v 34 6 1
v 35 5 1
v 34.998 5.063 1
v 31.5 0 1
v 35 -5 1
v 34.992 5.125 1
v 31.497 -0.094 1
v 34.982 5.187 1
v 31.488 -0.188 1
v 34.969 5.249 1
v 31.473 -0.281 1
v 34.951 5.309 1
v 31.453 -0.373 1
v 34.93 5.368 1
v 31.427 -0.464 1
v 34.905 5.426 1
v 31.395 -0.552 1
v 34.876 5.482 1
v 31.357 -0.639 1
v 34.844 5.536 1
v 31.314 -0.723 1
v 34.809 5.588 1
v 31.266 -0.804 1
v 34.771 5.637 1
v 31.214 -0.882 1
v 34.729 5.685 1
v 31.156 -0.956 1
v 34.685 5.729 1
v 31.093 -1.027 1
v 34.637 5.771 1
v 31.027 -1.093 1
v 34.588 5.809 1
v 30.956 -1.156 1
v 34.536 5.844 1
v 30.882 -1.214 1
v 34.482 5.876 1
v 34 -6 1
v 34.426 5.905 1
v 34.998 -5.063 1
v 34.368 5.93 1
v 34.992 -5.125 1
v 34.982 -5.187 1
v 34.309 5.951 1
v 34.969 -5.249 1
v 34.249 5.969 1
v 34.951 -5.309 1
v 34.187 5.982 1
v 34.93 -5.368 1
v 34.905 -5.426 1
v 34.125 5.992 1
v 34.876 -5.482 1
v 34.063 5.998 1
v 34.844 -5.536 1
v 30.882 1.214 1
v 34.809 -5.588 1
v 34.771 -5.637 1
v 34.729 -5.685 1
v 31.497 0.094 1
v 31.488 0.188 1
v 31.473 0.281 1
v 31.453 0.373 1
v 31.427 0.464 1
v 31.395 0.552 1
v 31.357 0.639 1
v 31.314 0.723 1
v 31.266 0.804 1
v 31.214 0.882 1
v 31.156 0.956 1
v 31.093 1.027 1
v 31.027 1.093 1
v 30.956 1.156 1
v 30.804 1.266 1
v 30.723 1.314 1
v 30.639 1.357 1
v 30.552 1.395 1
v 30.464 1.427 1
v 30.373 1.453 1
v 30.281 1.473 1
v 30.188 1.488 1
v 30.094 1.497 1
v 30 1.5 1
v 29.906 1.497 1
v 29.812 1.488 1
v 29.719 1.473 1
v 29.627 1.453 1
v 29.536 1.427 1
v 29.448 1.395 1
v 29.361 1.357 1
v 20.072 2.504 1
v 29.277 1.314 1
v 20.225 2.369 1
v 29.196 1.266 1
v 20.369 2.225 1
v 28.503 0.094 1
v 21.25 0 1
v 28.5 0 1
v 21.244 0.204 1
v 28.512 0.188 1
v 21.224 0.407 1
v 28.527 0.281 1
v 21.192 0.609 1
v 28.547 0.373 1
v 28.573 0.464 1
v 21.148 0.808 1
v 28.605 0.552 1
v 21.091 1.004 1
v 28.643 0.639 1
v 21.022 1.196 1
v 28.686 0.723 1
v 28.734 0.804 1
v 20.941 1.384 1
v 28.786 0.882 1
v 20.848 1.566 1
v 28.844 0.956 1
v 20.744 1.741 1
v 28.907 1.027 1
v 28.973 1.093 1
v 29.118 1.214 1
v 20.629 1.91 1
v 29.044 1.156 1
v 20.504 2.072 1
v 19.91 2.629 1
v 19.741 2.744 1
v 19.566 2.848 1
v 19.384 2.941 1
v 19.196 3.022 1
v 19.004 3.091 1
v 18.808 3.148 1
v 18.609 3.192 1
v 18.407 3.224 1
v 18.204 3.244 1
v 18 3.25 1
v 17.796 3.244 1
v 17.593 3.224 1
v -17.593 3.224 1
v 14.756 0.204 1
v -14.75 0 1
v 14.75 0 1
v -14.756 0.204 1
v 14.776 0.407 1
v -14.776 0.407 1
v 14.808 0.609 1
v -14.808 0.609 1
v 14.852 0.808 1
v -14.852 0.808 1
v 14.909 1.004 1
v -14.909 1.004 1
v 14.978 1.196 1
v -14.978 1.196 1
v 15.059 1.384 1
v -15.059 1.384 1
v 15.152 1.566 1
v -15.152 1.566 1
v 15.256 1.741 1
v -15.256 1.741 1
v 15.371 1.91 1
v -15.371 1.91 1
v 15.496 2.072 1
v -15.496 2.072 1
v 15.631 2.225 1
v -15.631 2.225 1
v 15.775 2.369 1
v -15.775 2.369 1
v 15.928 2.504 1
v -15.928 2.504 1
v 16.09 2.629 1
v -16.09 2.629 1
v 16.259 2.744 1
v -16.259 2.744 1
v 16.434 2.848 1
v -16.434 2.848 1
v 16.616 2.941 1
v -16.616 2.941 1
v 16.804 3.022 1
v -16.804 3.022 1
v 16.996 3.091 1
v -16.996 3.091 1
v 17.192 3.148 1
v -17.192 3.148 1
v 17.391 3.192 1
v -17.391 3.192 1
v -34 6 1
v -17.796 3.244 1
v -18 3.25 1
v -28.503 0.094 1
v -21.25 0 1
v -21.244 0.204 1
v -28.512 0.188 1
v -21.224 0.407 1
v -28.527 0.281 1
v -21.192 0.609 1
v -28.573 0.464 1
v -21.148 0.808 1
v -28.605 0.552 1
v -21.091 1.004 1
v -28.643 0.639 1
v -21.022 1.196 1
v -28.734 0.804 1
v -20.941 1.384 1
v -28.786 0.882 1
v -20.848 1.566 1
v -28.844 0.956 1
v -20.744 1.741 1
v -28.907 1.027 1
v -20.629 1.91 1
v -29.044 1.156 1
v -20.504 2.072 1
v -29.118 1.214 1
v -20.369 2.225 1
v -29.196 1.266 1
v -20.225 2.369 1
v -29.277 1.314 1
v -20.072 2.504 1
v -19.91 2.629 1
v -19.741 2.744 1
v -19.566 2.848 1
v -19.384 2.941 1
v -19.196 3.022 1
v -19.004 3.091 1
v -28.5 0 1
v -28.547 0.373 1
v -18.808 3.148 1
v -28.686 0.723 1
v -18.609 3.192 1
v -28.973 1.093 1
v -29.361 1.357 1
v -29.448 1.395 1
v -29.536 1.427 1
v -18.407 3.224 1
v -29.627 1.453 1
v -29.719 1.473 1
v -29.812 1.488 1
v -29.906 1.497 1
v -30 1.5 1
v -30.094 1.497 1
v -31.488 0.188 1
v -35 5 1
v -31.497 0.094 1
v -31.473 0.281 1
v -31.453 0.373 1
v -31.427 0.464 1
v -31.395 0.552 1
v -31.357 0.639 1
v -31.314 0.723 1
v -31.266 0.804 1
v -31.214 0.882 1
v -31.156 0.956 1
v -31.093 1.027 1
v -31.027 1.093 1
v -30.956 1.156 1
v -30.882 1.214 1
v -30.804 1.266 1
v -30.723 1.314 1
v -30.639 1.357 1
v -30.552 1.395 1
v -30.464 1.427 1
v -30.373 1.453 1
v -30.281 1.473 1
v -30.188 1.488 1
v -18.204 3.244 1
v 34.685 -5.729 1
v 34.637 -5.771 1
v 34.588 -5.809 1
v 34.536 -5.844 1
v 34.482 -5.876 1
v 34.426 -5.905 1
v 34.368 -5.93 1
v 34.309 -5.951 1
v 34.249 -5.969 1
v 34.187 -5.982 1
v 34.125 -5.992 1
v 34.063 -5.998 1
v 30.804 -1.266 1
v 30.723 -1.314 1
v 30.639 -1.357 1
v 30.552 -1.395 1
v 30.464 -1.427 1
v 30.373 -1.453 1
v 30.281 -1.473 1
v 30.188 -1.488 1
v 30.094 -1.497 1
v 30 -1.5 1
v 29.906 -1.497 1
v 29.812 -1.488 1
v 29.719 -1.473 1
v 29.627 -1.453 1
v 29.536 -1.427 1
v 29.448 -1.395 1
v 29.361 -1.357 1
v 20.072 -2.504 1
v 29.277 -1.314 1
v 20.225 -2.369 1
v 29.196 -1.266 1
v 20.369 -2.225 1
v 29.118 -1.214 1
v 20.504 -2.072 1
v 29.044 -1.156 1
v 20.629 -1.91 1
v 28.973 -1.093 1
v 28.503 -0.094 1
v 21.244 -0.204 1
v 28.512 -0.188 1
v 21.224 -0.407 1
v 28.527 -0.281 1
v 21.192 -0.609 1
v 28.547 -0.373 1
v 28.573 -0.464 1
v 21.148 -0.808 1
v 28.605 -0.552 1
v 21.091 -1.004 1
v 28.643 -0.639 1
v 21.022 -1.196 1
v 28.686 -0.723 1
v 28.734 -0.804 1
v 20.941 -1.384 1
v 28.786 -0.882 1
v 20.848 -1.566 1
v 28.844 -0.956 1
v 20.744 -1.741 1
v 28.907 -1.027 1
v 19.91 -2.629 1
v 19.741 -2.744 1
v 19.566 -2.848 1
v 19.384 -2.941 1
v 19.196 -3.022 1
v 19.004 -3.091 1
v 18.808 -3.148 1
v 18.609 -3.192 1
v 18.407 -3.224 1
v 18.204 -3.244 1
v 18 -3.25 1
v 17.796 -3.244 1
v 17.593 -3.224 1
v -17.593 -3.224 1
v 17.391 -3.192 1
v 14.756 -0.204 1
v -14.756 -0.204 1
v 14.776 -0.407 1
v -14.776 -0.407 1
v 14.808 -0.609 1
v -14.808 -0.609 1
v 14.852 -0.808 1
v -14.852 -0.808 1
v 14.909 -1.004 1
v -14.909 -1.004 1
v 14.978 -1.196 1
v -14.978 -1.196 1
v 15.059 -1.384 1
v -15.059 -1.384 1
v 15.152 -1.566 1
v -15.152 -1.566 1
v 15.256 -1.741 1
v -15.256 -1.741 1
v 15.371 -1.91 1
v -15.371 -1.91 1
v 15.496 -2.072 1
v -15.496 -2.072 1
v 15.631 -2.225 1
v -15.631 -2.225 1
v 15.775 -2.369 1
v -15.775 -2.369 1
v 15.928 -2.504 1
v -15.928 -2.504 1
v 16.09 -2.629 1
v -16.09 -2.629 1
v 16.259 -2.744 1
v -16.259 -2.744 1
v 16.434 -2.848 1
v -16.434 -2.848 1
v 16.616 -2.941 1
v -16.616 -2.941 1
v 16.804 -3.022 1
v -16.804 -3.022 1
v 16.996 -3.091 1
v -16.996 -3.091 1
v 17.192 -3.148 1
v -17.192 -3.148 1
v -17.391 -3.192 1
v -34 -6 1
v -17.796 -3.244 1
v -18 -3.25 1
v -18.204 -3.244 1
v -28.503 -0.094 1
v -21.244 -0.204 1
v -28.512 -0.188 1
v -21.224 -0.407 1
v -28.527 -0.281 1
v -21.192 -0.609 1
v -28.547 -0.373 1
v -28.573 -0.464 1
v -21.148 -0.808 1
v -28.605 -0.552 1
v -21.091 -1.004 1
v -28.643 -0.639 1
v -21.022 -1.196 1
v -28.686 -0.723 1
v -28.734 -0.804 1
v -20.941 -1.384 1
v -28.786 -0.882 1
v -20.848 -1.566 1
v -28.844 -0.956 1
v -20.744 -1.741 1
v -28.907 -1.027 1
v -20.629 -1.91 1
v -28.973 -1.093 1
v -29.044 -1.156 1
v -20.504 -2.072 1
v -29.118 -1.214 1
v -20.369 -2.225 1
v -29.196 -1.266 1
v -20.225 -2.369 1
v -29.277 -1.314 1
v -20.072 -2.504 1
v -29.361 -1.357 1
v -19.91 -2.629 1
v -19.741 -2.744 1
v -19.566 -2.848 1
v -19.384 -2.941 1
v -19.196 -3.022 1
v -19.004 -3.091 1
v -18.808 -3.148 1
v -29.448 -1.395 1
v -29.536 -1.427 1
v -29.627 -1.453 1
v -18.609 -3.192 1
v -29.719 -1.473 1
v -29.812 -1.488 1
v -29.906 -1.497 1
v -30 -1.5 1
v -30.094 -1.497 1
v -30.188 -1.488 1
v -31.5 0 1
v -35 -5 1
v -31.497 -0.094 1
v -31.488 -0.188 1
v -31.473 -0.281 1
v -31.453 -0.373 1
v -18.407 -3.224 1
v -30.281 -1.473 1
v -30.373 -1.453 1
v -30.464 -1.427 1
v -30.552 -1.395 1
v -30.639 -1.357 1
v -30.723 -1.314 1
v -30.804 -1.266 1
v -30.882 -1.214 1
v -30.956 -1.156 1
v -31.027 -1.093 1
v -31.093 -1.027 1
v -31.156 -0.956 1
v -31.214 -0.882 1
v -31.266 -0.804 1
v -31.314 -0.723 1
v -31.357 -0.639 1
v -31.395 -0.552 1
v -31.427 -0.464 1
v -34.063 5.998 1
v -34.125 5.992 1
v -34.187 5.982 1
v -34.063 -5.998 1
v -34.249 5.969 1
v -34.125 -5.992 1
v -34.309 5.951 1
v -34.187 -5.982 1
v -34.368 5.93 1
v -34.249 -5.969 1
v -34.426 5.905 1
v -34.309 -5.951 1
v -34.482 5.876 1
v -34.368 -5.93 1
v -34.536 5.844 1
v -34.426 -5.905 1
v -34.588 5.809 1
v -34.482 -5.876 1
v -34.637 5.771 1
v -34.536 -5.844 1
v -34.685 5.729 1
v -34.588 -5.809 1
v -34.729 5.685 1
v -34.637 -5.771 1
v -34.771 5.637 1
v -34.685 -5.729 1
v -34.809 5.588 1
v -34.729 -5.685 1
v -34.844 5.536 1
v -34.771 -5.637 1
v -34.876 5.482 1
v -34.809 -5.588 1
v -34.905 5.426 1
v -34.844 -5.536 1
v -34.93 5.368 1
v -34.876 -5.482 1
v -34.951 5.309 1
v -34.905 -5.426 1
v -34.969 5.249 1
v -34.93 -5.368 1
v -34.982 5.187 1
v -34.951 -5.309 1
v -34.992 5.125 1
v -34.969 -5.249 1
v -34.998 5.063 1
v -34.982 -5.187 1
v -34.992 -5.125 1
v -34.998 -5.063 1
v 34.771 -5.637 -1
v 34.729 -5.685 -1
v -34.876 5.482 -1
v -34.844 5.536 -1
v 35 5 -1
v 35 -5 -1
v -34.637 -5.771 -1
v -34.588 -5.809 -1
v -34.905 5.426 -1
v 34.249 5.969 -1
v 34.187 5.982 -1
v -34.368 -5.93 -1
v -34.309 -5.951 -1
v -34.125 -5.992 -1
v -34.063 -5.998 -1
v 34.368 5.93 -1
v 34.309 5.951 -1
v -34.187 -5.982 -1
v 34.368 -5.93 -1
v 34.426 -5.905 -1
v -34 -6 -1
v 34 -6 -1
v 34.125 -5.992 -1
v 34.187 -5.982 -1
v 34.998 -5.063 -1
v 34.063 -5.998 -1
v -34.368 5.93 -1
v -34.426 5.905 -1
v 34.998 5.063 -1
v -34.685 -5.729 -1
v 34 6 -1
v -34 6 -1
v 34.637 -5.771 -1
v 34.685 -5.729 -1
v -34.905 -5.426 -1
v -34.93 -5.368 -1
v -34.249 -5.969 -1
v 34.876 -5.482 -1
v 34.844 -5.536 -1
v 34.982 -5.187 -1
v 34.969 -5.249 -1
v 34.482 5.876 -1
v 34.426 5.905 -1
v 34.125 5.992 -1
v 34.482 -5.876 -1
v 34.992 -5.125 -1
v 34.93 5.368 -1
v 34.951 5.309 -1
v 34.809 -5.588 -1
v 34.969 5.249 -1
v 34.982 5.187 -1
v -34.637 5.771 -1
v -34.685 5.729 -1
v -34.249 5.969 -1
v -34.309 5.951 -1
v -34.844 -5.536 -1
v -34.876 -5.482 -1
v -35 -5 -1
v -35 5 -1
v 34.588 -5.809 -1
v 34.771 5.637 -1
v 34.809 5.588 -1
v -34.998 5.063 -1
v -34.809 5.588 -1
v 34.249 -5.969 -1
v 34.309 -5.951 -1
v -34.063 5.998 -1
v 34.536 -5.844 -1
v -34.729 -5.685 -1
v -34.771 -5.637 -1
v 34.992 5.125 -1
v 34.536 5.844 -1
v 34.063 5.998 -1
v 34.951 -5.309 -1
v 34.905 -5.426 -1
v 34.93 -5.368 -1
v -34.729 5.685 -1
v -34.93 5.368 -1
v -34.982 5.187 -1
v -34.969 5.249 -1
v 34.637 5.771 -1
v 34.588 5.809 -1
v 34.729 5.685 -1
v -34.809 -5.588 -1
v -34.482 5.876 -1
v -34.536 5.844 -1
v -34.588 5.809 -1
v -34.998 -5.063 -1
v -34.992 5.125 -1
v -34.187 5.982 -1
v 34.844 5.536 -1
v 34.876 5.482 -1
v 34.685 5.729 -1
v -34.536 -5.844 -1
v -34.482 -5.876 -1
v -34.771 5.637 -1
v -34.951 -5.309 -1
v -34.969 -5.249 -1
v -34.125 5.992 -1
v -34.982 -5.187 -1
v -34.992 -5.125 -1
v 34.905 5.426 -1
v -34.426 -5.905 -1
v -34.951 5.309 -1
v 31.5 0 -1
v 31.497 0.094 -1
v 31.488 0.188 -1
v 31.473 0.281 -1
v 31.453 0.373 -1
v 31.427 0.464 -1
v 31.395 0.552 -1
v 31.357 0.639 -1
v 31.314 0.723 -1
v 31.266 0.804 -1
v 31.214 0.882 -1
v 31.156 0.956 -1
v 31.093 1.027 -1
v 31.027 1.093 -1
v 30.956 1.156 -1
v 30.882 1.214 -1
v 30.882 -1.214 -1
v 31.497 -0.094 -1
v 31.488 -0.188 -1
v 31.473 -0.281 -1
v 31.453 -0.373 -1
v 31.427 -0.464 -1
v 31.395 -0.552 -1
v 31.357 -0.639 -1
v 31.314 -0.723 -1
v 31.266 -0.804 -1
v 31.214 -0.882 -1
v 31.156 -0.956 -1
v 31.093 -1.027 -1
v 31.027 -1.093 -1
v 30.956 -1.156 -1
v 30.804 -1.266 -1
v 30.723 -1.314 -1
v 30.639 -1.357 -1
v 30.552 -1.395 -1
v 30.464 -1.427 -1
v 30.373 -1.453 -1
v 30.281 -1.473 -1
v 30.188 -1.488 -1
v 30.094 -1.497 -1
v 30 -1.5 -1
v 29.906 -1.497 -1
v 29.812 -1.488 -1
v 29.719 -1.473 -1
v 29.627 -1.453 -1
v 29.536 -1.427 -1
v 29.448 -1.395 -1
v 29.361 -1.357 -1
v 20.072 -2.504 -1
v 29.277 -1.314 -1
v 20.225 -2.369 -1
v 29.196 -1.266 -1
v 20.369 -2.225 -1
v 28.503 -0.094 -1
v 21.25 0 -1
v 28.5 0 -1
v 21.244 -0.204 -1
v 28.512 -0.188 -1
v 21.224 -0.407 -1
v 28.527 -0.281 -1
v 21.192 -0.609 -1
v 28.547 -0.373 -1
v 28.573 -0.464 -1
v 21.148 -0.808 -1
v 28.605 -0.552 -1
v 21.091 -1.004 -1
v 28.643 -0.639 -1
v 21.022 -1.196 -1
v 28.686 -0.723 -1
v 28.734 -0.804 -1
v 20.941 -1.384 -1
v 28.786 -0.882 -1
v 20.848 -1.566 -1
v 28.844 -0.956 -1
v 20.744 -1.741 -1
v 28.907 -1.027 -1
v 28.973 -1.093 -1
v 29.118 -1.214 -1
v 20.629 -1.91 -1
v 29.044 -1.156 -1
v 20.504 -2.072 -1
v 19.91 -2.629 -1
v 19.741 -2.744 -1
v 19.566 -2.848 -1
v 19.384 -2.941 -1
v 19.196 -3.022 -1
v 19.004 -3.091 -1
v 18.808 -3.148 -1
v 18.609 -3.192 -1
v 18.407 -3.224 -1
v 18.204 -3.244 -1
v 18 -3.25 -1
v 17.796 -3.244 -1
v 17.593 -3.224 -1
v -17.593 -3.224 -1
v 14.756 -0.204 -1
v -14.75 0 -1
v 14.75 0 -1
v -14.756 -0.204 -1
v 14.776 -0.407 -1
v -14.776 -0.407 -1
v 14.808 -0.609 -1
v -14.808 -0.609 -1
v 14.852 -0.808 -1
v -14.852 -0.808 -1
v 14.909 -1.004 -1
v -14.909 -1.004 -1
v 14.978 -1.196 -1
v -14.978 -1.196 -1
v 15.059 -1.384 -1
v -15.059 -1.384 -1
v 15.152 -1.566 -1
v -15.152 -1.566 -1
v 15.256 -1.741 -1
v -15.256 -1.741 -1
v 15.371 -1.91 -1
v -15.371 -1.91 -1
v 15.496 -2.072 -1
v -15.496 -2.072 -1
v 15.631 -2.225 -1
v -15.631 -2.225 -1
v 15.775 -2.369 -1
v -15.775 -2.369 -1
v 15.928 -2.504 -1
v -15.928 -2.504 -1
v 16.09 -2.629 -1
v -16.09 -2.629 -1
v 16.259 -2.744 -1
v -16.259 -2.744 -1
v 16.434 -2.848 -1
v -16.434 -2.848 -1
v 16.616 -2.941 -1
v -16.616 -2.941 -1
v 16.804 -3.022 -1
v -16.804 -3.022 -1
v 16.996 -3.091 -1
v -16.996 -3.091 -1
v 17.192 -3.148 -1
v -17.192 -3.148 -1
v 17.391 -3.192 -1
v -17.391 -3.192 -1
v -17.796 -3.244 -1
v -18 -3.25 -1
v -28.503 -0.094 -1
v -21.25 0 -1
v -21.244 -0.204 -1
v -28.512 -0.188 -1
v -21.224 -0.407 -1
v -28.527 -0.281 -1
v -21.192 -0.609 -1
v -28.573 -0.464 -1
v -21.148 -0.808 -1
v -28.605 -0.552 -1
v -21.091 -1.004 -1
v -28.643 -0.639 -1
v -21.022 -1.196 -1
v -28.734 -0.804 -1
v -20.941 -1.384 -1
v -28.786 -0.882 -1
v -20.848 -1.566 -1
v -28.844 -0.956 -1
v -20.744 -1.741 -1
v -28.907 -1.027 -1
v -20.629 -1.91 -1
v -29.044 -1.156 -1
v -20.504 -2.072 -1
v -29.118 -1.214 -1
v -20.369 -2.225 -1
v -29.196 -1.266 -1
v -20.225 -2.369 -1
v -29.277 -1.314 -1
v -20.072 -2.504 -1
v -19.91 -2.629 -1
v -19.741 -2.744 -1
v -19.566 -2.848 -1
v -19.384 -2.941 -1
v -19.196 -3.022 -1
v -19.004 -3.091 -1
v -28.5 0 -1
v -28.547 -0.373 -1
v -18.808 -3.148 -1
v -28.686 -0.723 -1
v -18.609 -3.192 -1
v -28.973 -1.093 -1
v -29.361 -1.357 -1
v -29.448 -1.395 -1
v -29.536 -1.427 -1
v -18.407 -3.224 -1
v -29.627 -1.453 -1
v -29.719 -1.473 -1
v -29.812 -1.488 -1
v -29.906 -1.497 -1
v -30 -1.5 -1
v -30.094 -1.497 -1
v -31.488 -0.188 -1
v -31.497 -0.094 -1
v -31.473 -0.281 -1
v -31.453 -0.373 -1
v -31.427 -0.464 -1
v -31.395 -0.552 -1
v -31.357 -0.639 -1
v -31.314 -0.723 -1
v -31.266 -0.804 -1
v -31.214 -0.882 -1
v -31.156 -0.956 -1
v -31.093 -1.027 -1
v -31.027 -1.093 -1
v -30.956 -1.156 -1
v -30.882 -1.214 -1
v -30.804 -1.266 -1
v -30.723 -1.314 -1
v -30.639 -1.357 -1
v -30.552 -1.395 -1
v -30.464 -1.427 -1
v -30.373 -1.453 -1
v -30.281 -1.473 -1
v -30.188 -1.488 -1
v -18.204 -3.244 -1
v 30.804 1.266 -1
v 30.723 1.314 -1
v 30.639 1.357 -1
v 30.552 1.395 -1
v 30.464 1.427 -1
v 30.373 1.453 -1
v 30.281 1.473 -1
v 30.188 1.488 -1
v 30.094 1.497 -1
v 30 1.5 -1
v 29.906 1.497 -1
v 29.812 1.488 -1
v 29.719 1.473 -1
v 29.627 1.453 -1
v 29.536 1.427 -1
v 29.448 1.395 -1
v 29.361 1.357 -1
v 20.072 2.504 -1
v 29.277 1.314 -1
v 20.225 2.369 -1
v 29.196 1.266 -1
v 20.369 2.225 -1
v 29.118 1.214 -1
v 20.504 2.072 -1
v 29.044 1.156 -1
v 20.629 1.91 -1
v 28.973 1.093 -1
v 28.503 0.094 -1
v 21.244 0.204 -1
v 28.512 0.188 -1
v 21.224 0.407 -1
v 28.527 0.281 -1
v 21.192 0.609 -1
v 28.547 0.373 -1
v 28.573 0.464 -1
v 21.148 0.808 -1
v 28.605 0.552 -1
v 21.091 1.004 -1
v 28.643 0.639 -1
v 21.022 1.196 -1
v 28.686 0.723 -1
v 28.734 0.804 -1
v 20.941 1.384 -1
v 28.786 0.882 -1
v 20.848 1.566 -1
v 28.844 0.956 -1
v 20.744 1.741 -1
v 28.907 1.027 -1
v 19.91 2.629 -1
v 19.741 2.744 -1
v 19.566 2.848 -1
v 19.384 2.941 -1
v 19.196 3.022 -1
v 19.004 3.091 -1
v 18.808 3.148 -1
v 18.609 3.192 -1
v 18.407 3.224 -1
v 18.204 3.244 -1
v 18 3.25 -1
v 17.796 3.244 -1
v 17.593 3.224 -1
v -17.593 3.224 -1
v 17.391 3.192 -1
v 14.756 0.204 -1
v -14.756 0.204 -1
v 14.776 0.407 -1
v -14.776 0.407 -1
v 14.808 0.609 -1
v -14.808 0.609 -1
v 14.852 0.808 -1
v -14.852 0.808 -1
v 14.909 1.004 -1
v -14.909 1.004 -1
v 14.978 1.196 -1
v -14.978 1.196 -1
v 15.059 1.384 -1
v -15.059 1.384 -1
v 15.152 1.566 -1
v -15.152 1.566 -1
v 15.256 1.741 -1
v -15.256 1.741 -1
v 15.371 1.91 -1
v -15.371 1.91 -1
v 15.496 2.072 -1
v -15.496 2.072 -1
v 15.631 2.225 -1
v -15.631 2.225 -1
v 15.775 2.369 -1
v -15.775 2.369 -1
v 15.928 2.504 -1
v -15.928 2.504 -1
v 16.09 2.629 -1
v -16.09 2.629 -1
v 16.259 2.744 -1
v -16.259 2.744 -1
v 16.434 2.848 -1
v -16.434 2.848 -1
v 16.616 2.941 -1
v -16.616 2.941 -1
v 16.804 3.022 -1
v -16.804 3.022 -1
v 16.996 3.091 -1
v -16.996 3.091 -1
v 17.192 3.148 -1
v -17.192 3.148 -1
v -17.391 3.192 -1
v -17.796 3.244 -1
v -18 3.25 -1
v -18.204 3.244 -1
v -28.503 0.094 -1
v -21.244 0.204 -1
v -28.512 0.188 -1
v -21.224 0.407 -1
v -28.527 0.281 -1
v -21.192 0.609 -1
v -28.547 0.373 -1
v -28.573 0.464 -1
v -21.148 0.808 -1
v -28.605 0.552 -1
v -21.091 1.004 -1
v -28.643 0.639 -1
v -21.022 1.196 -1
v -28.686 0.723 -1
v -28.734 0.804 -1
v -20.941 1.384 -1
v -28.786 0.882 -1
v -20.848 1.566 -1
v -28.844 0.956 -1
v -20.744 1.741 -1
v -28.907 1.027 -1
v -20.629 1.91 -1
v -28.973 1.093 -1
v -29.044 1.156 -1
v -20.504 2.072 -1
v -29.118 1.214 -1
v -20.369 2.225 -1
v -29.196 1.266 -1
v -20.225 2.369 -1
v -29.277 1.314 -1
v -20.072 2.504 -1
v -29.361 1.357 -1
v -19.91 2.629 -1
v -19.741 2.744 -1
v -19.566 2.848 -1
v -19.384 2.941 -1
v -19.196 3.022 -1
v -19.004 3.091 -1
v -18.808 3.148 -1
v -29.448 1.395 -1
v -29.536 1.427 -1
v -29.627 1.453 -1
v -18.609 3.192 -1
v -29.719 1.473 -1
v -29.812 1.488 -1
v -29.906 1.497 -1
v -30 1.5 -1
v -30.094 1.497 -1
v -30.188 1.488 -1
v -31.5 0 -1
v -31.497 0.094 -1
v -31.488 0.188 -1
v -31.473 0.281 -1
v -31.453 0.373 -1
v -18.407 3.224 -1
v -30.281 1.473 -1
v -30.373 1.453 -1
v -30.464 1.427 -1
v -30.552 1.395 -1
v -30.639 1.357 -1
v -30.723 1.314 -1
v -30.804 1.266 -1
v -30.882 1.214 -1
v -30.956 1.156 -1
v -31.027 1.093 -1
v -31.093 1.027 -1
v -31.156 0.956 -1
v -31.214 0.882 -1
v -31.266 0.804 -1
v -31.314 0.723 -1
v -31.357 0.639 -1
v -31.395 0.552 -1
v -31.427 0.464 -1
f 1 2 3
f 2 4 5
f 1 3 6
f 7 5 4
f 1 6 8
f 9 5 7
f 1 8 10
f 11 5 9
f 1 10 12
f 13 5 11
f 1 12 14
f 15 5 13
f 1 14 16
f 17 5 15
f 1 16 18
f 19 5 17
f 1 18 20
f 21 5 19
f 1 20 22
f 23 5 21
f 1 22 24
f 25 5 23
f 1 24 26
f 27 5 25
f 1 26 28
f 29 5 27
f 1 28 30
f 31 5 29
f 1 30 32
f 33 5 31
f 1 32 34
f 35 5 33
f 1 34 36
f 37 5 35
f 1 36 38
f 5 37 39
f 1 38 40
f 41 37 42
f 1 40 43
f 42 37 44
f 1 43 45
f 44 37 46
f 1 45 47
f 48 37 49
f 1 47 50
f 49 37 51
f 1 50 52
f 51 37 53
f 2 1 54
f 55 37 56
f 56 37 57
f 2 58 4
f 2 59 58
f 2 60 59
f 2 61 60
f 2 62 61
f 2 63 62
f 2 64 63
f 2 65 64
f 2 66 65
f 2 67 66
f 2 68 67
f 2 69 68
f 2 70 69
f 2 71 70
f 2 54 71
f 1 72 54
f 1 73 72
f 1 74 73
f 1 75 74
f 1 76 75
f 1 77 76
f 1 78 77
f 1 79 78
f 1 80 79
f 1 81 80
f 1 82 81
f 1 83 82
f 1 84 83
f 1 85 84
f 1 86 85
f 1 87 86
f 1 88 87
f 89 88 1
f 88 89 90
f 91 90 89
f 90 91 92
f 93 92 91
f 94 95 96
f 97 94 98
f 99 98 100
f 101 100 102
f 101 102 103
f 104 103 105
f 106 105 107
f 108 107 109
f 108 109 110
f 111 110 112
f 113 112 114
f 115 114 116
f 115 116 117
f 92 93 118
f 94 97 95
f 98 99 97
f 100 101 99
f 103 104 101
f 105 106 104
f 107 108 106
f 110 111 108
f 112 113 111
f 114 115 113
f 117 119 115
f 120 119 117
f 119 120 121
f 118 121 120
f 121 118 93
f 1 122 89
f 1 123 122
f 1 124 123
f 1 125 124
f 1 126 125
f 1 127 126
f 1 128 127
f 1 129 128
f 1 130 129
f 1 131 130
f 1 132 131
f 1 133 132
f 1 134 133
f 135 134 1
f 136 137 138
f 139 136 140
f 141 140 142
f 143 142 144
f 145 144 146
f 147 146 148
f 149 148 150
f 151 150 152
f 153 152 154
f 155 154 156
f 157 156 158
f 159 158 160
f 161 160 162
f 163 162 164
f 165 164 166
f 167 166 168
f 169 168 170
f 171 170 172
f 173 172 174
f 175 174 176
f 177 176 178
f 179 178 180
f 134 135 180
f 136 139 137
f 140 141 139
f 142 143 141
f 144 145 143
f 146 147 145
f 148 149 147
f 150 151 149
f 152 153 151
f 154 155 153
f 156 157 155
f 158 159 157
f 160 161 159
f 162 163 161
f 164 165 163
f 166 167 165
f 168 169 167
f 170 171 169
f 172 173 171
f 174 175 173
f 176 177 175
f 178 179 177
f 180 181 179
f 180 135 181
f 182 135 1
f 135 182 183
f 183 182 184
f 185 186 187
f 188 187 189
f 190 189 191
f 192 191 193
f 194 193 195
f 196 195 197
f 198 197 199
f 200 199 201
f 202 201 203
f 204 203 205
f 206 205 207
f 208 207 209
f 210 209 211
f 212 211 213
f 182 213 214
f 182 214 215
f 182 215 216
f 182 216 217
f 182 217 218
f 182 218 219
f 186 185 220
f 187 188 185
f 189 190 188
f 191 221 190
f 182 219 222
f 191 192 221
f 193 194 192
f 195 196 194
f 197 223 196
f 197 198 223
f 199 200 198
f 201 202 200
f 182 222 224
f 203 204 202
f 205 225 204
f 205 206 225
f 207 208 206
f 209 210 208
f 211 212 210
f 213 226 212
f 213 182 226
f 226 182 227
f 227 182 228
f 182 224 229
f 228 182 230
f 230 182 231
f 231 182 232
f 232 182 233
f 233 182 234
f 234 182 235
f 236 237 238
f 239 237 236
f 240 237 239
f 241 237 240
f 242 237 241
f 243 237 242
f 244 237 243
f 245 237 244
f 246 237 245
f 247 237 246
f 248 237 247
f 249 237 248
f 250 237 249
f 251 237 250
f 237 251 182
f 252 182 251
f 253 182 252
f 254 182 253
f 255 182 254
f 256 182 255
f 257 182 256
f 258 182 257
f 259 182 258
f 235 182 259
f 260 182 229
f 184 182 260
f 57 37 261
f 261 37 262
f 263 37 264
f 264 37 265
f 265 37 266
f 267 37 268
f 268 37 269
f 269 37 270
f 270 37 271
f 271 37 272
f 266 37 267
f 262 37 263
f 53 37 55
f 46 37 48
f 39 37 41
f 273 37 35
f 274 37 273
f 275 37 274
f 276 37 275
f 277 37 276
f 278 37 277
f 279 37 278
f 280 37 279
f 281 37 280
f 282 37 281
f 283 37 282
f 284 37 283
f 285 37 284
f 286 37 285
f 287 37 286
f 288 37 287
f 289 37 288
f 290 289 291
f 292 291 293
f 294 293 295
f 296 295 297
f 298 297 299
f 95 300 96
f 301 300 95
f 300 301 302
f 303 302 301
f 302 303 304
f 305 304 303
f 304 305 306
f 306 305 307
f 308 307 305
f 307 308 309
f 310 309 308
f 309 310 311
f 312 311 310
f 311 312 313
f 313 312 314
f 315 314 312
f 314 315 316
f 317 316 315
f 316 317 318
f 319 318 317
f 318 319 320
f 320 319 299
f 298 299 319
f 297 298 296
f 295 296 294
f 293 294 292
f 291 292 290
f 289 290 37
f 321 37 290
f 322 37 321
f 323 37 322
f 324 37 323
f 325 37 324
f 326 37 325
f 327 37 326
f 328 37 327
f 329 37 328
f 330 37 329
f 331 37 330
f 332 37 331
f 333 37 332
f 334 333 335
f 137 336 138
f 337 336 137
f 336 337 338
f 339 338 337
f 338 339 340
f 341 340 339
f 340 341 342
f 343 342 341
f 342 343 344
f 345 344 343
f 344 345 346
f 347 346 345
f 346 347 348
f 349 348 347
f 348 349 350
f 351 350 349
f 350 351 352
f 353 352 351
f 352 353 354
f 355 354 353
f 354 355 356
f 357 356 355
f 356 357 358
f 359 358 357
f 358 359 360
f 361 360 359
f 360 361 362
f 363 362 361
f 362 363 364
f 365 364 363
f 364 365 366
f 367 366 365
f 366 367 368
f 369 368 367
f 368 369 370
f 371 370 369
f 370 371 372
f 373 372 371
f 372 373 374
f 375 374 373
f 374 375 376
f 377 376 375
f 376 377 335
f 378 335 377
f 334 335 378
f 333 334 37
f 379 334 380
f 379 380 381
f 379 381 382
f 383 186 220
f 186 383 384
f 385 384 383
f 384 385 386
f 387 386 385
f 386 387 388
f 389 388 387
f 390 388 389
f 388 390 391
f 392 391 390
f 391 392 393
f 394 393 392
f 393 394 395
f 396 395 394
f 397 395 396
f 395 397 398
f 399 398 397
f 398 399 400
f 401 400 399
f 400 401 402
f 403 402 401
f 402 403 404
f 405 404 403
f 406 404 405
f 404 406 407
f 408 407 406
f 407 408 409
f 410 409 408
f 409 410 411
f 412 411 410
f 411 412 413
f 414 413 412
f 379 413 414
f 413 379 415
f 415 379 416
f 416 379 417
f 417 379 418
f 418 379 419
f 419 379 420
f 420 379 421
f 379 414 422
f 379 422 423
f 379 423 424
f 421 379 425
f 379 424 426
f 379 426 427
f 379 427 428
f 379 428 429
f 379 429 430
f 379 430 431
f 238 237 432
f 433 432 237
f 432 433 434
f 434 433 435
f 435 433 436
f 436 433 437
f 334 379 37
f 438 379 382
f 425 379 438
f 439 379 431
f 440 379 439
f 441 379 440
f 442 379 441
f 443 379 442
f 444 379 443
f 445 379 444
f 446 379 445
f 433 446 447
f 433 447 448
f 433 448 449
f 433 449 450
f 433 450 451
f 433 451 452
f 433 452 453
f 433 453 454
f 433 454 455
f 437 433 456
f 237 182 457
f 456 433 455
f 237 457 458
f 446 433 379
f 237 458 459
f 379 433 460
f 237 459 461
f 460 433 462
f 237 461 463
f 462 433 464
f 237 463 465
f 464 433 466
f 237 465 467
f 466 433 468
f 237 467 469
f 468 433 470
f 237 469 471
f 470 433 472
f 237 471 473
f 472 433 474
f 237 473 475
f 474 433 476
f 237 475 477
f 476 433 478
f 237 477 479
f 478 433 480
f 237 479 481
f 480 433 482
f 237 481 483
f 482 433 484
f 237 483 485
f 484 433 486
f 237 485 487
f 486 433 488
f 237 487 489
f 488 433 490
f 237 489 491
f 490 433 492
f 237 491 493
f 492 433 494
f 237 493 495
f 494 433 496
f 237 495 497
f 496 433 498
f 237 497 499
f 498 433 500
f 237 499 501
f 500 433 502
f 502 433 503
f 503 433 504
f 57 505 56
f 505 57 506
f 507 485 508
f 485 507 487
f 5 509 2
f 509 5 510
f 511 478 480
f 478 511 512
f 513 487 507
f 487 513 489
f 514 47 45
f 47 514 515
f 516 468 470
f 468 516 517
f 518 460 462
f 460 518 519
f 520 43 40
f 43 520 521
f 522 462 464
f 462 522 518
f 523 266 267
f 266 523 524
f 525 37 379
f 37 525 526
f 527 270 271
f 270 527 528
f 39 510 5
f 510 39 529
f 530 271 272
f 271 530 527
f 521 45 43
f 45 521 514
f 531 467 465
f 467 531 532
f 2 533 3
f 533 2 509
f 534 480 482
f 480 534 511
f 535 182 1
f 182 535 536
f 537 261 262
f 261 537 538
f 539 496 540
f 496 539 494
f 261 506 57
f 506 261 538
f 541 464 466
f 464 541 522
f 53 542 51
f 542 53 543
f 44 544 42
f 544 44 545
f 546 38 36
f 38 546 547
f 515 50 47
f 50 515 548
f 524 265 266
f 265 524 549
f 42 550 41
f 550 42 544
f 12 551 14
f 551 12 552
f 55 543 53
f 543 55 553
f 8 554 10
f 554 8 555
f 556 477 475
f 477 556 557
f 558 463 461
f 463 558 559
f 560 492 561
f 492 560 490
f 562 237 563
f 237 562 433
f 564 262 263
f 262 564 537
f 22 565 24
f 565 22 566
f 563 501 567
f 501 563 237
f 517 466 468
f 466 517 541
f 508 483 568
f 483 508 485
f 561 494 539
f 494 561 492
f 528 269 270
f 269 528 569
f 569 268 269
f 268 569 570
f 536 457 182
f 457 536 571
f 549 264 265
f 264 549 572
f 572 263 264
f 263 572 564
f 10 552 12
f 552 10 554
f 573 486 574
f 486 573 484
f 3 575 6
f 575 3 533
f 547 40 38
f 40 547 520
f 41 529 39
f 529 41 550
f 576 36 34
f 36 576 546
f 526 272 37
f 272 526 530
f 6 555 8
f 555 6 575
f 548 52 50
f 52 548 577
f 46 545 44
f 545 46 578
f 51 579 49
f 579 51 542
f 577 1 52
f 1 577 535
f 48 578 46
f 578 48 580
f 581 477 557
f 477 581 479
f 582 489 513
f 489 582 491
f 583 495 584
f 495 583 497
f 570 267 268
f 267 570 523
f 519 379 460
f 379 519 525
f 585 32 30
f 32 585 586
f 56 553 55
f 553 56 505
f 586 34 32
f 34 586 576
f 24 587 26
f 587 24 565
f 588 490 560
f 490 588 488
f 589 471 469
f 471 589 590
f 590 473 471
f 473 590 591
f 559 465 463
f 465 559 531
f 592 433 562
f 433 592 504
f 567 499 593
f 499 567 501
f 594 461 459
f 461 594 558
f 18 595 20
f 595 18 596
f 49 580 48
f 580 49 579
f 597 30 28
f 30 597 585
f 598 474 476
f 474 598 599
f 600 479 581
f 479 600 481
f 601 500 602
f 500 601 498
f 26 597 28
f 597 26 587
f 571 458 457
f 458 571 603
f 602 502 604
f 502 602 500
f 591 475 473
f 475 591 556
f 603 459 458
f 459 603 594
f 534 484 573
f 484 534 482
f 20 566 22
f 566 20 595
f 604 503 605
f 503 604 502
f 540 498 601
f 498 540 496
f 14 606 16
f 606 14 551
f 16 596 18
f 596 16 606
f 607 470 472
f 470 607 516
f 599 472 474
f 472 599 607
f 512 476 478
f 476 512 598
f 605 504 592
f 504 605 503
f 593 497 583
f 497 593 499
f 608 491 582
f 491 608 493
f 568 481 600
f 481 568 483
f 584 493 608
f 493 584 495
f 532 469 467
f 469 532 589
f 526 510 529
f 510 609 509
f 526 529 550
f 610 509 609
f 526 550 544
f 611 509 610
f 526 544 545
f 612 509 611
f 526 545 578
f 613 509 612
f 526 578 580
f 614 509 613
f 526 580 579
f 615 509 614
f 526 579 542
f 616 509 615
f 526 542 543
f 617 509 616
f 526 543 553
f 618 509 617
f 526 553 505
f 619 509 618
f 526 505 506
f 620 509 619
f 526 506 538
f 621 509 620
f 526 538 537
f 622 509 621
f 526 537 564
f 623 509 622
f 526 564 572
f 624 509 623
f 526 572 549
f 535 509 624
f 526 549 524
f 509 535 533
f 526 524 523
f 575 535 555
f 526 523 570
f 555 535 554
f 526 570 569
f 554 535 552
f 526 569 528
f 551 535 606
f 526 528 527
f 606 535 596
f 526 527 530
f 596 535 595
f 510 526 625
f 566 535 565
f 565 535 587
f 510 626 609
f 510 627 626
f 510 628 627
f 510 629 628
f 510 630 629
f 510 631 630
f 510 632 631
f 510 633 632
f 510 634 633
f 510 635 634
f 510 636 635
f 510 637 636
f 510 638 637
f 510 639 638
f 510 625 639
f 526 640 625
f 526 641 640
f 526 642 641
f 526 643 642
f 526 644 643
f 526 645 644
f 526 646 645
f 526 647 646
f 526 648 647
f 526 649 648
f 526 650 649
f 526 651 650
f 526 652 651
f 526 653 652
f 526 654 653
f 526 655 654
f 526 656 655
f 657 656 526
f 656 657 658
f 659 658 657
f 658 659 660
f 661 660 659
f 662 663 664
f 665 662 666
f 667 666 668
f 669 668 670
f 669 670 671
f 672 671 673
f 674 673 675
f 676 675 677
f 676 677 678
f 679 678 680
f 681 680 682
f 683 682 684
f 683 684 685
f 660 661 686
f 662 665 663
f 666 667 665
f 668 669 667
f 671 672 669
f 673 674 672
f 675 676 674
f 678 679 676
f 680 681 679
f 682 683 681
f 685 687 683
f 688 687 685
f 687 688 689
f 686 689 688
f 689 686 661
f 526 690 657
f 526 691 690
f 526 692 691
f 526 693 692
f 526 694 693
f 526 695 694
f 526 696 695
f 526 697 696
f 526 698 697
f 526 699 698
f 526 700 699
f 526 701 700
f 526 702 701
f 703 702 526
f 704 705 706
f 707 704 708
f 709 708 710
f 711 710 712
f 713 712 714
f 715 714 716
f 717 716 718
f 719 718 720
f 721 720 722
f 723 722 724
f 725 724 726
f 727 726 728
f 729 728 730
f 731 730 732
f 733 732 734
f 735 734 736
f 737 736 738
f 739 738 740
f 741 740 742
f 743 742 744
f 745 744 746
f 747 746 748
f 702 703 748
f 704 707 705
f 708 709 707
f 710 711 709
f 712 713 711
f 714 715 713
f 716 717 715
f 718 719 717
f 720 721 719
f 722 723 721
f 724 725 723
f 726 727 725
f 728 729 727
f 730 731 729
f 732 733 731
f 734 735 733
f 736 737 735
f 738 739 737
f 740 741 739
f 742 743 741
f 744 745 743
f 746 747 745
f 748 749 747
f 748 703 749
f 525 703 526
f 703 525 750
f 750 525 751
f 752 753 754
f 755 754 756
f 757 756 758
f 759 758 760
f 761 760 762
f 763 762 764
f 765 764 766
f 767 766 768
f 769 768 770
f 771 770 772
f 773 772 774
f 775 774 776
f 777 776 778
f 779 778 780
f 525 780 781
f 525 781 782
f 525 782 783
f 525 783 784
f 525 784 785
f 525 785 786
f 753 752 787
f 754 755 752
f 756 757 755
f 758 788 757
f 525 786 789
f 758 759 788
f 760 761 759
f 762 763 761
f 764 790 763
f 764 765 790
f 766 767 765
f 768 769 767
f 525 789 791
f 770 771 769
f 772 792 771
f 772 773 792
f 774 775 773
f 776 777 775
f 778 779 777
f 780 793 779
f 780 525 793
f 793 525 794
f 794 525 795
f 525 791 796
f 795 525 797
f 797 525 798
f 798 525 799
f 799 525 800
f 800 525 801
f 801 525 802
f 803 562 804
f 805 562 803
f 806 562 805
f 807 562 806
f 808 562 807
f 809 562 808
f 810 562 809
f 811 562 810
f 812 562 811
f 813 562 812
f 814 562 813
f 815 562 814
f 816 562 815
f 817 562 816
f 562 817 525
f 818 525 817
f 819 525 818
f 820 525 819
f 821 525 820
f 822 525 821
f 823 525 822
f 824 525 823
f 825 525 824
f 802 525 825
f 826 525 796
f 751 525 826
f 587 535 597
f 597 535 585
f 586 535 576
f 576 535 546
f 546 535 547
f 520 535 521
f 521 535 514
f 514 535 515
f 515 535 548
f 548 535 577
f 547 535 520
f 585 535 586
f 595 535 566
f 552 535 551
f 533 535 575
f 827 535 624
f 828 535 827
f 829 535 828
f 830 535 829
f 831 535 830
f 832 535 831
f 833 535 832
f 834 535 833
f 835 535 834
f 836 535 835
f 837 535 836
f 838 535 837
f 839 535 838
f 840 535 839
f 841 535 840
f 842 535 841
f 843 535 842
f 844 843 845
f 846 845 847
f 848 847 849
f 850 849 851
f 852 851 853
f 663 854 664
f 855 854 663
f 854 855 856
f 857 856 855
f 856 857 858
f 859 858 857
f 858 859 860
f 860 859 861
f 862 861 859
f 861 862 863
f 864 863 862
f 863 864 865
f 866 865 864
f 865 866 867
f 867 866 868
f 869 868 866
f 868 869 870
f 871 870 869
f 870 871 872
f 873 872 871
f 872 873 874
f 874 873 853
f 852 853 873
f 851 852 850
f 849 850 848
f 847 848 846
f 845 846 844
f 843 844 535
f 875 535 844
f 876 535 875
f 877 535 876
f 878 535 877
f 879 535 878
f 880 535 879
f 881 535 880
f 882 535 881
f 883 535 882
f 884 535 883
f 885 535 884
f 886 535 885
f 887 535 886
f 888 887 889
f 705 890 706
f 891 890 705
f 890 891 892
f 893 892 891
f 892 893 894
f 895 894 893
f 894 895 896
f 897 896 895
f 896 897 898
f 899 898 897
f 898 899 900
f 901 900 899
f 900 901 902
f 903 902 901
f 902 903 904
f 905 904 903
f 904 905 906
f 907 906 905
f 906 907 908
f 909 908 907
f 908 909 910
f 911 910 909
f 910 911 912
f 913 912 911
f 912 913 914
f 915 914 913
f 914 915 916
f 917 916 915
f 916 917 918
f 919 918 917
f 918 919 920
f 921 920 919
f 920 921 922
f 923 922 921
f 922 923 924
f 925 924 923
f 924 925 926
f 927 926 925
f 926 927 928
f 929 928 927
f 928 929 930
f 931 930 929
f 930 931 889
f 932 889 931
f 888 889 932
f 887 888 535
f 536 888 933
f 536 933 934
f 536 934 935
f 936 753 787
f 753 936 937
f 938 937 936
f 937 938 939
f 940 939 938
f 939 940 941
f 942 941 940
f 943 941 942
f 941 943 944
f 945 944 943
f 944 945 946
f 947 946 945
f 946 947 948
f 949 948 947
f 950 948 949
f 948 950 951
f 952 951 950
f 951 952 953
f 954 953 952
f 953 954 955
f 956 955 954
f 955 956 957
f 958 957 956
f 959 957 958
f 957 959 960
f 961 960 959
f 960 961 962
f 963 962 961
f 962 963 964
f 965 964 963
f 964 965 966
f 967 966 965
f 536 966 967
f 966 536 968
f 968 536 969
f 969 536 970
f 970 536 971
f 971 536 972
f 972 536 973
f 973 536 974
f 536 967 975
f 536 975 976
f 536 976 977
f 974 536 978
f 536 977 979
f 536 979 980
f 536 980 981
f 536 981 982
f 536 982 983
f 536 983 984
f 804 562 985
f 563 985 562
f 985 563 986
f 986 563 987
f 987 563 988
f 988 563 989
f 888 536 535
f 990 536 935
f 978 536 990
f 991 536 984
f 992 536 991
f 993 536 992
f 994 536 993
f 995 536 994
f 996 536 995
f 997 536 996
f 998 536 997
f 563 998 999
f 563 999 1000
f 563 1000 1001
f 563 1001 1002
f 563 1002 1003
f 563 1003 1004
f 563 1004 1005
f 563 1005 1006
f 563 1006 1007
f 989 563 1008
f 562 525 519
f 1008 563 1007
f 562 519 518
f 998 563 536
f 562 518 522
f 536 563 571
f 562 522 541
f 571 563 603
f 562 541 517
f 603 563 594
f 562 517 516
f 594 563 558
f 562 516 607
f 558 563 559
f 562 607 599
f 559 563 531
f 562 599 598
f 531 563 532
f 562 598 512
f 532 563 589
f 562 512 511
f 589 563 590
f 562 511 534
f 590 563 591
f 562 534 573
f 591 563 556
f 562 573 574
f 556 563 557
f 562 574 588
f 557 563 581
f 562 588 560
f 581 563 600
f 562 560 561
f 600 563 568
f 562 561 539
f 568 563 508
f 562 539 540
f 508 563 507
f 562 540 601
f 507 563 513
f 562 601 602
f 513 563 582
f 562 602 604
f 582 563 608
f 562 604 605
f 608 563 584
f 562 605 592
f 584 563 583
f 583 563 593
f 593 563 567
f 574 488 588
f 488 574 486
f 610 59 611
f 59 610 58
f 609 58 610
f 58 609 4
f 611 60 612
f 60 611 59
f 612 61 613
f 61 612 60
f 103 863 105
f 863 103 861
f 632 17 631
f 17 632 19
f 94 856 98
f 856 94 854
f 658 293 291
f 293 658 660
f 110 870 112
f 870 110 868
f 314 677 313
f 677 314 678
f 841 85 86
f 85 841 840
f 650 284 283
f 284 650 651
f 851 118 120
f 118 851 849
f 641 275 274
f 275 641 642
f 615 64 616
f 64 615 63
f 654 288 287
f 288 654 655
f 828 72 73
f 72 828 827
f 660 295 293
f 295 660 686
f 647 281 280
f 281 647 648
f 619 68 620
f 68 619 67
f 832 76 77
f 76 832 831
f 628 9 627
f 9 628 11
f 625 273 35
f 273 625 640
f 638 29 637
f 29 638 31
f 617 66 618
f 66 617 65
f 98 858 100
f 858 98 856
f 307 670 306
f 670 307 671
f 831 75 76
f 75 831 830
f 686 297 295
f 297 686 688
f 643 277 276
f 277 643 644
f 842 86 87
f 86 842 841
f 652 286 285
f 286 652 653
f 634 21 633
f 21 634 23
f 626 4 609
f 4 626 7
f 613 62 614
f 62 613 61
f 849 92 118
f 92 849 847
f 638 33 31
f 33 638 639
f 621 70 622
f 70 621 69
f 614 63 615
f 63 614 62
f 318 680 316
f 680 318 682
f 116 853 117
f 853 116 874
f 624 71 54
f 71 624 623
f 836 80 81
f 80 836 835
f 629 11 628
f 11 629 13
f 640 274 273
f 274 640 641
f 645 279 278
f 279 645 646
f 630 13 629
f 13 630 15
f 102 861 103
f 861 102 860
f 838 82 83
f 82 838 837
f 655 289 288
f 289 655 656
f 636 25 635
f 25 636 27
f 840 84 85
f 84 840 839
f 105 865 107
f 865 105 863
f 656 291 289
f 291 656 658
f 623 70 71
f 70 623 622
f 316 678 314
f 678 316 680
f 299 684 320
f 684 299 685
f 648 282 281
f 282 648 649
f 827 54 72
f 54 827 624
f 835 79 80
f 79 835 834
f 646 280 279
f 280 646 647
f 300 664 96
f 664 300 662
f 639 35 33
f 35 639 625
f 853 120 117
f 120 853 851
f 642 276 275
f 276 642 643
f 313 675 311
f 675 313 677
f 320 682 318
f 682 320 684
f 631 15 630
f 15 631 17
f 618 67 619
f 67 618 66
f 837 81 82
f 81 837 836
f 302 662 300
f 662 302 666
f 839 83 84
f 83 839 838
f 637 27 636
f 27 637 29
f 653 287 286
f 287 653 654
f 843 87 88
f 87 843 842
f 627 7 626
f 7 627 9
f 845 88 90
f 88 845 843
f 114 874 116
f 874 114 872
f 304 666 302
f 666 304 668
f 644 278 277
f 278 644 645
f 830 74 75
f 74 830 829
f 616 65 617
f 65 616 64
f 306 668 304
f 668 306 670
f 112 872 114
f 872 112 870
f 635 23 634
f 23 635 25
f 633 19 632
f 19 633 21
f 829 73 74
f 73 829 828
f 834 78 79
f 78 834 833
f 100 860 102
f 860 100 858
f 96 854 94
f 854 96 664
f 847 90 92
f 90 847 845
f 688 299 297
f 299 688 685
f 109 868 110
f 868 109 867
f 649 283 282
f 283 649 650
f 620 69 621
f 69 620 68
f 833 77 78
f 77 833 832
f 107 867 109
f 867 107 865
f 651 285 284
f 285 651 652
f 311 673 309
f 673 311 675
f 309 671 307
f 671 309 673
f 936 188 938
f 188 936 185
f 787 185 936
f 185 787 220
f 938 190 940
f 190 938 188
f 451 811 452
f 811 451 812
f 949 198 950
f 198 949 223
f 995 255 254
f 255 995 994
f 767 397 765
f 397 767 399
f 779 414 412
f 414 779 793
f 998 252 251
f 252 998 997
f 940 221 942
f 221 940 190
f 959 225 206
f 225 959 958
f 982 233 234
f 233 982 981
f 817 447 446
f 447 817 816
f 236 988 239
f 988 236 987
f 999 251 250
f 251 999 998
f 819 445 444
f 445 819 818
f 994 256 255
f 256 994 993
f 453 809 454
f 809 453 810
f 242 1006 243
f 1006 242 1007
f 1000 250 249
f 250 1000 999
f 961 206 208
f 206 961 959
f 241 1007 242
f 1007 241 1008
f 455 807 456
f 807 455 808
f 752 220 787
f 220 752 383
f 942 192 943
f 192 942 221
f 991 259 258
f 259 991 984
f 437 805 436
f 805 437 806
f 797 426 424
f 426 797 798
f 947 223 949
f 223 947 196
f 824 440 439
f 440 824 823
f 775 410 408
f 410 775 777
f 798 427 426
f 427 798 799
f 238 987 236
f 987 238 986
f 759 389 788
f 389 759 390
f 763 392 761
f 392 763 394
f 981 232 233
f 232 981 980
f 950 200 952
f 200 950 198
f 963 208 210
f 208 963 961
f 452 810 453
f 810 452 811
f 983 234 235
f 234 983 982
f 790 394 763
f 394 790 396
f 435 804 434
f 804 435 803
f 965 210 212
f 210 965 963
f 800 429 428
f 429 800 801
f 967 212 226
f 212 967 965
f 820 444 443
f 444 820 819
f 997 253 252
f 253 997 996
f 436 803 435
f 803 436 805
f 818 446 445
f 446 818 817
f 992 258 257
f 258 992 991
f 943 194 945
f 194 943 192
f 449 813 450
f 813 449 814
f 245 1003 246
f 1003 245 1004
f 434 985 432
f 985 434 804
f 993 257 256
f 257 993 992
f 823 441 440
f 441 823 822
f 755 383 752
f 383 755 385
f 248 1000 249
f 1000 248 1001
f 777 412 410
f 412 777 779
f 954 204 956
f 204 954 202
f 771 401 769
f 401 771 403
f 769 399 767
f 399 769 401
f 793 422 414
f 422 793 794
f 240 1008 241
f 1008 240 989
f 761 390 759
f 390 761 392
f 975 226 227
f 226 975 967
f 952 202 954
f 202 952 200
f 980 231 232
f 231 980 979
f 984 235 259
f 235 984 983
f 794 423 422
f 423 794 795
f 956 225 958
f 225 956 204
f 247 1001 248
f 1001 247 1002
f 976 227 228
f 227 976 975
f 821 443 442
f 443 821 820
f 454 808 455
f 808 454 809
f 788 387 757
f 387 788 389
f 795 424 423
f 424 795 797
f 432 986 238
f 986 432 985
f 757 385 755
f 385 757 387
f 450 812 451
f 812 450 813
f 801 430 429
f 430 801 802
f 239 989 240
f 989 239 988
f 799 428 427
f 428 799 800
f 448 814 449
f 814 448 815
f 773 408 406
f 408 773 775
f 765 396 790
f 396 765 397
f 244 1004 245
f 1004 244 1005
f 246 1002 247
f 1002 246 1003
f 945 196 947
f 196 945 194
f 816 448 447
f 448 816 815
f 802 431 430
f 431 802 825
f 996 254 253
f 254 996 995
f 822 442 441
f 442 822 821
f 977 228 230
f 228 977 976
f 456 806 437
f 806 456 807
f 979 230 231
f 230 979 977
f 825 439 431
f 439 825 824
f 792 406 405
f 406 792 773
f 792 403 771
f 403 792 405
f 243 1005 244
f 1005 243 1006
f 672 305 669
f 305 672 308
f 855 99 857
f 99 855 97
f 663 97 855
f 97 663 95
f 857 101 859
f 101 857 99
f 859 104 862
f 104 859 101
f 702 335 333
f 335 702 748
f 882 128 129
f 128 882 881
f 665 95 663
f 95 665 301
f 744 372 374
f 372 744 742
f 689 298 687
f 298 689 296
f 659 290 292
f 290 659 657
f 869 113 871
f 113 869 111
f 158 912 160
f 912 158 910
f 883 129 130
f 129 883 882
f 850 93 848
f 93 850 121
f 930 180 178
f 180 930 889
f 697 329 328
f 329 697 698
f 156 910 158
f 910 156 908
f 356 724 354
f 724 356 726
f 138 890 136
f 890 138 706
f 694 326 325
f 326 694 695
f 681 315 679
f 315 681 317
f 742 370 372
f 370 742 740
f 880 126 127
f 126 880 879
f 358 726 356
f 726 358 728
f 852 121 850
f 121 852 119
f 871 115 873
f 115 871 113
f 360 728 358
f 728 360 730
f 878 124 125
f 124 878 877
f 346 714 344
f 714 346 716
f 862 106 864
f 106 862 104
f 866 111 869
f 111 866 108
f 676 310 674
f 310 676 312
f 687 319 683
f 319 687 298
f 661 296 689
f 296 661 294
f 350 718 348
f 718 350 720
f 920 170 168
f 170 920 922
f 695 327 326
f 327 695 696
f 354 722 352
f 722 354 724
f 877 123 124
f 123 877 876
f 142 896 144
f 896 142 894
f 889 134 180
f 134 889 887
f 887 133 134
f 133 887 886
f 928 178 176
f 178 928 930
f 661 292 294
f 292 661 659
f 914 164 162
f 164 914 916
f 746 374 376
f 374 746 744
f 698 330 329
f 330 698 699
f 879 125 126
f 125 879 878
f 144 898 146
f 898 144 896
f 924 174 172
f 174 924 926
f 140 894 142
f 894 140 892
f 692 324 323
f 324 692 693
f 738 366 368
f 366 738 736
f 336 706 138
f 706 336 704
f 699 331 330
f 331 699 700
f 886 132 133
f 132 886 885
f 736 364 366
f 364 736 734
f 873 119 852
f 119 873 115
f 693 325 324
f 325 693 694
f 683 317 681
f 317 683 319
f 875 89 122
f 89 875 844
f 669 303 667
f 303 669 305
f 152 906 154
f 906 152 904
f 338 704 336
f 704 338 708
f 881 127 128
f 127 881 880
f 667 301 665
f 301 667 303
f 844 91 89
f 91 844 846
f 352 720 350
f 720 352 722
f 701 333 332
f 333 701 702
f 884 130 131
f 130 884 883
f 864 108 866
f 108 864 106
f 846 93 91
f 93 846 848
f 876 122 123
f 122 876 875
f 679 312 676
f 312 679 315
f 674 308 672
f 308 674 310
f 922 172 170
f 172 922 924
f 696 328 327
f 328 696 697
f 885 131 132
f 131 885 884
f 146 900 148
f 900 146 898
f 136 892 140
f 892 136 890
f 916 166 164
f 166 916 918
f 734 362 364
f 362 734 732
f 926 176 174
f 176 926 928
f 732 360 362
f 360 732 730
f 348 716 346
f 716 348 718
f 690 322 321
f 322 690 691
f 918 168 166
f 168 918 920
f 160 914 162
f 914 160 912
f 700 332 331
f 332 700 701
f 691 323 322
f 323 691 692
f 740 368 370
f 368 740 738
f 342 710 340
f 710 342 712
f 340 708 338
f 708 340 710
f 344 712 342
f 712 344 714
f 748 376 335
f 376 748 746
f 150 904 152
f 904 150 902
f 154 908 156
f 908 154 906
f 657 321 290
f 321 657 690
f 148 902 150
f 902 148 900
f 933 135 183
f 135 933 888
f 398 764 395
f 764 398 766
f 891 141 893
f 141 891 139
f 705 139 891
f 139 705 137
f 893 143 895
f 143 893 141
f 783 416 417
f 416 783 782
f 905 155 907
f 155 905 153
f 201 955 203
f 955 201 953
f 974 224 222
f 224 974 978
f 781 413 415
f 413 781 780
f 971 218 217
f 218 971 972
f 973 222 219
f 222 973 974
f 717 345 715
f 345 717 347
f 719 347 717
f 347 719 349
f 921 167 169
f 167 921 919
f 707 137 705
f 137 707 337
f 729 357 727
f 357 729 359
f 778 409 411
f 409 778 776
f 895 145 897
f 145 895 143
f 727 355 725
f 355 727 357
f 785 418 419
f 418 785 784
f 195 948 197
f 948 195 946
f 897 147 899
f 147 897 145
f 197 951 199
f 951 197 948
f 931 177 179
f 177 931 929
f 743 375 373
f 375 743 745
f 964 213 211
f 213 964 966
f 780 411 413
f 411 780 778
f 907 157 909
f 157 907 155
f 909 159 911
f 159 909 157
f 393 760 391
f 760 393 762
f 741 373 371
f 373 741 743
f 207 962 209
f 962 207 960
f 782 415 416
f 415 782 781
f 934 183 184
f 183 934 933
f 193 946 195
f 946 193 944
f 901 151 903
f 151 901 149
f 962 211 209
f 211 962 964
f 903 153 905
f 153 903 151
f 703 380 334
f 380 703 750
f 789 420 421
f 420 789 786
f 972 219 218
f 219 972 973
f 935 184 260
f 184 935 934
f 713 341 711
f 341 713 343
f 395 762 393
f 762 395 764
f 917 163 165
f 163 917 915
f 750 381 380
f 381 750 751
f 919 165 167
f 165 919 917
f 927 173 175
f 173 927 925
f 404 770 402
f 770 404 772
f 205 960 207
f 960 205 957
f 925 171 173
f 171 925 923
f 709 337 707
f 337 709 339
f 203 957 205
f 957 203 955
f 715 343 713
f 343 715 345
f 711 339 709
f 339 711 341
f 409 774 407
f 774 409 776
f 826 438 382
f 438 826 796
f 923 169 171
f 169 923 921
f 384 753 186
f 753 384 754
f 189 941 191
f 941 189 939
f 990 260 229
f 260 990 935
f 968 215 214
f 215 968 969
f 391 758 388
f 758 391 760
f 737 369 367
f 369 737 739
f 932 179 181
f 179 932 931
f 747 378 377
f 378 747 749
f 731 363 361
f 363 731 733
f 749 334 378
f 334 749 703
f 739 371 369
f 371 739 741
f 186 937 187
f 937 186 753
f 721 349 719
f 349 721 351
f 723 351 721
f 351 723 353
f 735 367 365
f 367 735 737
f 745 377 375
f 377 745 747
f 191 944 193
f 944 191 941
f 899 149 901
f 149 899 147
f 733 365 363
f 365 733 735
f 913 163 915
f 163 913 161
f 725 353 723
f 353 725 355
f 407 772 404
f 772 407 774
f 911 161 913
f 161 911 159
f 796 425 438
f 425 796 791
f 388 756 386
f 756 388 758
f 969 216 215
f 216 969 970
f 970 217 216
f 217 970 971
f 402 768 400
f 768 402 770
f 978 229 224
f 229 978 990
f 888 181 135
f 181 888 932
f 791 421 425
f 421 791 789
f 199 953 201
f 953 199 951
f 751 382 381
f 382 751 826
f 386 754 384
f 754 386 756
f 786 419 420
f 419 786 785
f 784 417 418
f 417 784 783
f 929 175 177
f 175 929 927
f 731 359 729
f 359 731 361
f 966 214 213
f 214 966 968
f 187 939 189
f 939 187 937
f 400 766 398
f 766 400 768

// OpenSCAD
/**
 * MIT License
 *
 * Copyright (c) 2026 Adam Kuczyński
 *
 * Permission is hereby granted, free of charge, to any person obtaining a copy
 * of this software and associated documentation files (the "Software"), to deal
 * in the Software without restriction, including without limitation the rights
 * to use, copy, modify, merge, publish, distribute, sublicense, and/or sell
 * copies of the Software, and to permit persons to whom the Software is
 * furnished to do so, subject to the following conditions:
 *
 * The above copyright notice and this permission notice shall be included in all
 * copies or substantial portions of the Software.
 *
 * THE SOFTWARE IS PROVIDED "AS IS", WITHOUT WARRANTY OF ANY KIND, EXPRESS OR
 * IMPLIED, INCLUDING BUT NOT LIMITED TO THE WARRANTIES OF MERCHANTABILITY,
 * FITNESS FOR A PARTICULAR PURPOSE AND NONINFRINGEMENT. IN NO EVENT SHALL THE
 * AUTHORS OR COPYRIGHT HOLDERS BE LIABLE FOR ANY CLAIM, DAMAGES OR OTHER
 * LIABILITY, WHETHER IN AN ACTION OF CONTRACT, TORT OR OTHERWISE, ARISING FROM,
 * OUT OF OR IN CONNECTION WITH THE SOFTWARE OR THE USE OR OTHER DEALINGS IN THE
 * SOFTWARE.
 */

$fn = 100;

difference() {
  minkowski() {
    cube([68, 10, 1], center = true);
    cylinder(h = 1, r = 1, center = true);
  }
  translate([30, 0, 0])
    cylinder(h = 2, d = 3, center = true);
  translate([-30, 0, 0])
    cylinder(h = 2, d = 3, center = true);
  translate([18, 0, 0])
    cylinder(h = 2, d = 6.5, center = true);
  translate([-18, 0, 0])
    cylinder(h = 2, d = 6.5, center = true);
}
